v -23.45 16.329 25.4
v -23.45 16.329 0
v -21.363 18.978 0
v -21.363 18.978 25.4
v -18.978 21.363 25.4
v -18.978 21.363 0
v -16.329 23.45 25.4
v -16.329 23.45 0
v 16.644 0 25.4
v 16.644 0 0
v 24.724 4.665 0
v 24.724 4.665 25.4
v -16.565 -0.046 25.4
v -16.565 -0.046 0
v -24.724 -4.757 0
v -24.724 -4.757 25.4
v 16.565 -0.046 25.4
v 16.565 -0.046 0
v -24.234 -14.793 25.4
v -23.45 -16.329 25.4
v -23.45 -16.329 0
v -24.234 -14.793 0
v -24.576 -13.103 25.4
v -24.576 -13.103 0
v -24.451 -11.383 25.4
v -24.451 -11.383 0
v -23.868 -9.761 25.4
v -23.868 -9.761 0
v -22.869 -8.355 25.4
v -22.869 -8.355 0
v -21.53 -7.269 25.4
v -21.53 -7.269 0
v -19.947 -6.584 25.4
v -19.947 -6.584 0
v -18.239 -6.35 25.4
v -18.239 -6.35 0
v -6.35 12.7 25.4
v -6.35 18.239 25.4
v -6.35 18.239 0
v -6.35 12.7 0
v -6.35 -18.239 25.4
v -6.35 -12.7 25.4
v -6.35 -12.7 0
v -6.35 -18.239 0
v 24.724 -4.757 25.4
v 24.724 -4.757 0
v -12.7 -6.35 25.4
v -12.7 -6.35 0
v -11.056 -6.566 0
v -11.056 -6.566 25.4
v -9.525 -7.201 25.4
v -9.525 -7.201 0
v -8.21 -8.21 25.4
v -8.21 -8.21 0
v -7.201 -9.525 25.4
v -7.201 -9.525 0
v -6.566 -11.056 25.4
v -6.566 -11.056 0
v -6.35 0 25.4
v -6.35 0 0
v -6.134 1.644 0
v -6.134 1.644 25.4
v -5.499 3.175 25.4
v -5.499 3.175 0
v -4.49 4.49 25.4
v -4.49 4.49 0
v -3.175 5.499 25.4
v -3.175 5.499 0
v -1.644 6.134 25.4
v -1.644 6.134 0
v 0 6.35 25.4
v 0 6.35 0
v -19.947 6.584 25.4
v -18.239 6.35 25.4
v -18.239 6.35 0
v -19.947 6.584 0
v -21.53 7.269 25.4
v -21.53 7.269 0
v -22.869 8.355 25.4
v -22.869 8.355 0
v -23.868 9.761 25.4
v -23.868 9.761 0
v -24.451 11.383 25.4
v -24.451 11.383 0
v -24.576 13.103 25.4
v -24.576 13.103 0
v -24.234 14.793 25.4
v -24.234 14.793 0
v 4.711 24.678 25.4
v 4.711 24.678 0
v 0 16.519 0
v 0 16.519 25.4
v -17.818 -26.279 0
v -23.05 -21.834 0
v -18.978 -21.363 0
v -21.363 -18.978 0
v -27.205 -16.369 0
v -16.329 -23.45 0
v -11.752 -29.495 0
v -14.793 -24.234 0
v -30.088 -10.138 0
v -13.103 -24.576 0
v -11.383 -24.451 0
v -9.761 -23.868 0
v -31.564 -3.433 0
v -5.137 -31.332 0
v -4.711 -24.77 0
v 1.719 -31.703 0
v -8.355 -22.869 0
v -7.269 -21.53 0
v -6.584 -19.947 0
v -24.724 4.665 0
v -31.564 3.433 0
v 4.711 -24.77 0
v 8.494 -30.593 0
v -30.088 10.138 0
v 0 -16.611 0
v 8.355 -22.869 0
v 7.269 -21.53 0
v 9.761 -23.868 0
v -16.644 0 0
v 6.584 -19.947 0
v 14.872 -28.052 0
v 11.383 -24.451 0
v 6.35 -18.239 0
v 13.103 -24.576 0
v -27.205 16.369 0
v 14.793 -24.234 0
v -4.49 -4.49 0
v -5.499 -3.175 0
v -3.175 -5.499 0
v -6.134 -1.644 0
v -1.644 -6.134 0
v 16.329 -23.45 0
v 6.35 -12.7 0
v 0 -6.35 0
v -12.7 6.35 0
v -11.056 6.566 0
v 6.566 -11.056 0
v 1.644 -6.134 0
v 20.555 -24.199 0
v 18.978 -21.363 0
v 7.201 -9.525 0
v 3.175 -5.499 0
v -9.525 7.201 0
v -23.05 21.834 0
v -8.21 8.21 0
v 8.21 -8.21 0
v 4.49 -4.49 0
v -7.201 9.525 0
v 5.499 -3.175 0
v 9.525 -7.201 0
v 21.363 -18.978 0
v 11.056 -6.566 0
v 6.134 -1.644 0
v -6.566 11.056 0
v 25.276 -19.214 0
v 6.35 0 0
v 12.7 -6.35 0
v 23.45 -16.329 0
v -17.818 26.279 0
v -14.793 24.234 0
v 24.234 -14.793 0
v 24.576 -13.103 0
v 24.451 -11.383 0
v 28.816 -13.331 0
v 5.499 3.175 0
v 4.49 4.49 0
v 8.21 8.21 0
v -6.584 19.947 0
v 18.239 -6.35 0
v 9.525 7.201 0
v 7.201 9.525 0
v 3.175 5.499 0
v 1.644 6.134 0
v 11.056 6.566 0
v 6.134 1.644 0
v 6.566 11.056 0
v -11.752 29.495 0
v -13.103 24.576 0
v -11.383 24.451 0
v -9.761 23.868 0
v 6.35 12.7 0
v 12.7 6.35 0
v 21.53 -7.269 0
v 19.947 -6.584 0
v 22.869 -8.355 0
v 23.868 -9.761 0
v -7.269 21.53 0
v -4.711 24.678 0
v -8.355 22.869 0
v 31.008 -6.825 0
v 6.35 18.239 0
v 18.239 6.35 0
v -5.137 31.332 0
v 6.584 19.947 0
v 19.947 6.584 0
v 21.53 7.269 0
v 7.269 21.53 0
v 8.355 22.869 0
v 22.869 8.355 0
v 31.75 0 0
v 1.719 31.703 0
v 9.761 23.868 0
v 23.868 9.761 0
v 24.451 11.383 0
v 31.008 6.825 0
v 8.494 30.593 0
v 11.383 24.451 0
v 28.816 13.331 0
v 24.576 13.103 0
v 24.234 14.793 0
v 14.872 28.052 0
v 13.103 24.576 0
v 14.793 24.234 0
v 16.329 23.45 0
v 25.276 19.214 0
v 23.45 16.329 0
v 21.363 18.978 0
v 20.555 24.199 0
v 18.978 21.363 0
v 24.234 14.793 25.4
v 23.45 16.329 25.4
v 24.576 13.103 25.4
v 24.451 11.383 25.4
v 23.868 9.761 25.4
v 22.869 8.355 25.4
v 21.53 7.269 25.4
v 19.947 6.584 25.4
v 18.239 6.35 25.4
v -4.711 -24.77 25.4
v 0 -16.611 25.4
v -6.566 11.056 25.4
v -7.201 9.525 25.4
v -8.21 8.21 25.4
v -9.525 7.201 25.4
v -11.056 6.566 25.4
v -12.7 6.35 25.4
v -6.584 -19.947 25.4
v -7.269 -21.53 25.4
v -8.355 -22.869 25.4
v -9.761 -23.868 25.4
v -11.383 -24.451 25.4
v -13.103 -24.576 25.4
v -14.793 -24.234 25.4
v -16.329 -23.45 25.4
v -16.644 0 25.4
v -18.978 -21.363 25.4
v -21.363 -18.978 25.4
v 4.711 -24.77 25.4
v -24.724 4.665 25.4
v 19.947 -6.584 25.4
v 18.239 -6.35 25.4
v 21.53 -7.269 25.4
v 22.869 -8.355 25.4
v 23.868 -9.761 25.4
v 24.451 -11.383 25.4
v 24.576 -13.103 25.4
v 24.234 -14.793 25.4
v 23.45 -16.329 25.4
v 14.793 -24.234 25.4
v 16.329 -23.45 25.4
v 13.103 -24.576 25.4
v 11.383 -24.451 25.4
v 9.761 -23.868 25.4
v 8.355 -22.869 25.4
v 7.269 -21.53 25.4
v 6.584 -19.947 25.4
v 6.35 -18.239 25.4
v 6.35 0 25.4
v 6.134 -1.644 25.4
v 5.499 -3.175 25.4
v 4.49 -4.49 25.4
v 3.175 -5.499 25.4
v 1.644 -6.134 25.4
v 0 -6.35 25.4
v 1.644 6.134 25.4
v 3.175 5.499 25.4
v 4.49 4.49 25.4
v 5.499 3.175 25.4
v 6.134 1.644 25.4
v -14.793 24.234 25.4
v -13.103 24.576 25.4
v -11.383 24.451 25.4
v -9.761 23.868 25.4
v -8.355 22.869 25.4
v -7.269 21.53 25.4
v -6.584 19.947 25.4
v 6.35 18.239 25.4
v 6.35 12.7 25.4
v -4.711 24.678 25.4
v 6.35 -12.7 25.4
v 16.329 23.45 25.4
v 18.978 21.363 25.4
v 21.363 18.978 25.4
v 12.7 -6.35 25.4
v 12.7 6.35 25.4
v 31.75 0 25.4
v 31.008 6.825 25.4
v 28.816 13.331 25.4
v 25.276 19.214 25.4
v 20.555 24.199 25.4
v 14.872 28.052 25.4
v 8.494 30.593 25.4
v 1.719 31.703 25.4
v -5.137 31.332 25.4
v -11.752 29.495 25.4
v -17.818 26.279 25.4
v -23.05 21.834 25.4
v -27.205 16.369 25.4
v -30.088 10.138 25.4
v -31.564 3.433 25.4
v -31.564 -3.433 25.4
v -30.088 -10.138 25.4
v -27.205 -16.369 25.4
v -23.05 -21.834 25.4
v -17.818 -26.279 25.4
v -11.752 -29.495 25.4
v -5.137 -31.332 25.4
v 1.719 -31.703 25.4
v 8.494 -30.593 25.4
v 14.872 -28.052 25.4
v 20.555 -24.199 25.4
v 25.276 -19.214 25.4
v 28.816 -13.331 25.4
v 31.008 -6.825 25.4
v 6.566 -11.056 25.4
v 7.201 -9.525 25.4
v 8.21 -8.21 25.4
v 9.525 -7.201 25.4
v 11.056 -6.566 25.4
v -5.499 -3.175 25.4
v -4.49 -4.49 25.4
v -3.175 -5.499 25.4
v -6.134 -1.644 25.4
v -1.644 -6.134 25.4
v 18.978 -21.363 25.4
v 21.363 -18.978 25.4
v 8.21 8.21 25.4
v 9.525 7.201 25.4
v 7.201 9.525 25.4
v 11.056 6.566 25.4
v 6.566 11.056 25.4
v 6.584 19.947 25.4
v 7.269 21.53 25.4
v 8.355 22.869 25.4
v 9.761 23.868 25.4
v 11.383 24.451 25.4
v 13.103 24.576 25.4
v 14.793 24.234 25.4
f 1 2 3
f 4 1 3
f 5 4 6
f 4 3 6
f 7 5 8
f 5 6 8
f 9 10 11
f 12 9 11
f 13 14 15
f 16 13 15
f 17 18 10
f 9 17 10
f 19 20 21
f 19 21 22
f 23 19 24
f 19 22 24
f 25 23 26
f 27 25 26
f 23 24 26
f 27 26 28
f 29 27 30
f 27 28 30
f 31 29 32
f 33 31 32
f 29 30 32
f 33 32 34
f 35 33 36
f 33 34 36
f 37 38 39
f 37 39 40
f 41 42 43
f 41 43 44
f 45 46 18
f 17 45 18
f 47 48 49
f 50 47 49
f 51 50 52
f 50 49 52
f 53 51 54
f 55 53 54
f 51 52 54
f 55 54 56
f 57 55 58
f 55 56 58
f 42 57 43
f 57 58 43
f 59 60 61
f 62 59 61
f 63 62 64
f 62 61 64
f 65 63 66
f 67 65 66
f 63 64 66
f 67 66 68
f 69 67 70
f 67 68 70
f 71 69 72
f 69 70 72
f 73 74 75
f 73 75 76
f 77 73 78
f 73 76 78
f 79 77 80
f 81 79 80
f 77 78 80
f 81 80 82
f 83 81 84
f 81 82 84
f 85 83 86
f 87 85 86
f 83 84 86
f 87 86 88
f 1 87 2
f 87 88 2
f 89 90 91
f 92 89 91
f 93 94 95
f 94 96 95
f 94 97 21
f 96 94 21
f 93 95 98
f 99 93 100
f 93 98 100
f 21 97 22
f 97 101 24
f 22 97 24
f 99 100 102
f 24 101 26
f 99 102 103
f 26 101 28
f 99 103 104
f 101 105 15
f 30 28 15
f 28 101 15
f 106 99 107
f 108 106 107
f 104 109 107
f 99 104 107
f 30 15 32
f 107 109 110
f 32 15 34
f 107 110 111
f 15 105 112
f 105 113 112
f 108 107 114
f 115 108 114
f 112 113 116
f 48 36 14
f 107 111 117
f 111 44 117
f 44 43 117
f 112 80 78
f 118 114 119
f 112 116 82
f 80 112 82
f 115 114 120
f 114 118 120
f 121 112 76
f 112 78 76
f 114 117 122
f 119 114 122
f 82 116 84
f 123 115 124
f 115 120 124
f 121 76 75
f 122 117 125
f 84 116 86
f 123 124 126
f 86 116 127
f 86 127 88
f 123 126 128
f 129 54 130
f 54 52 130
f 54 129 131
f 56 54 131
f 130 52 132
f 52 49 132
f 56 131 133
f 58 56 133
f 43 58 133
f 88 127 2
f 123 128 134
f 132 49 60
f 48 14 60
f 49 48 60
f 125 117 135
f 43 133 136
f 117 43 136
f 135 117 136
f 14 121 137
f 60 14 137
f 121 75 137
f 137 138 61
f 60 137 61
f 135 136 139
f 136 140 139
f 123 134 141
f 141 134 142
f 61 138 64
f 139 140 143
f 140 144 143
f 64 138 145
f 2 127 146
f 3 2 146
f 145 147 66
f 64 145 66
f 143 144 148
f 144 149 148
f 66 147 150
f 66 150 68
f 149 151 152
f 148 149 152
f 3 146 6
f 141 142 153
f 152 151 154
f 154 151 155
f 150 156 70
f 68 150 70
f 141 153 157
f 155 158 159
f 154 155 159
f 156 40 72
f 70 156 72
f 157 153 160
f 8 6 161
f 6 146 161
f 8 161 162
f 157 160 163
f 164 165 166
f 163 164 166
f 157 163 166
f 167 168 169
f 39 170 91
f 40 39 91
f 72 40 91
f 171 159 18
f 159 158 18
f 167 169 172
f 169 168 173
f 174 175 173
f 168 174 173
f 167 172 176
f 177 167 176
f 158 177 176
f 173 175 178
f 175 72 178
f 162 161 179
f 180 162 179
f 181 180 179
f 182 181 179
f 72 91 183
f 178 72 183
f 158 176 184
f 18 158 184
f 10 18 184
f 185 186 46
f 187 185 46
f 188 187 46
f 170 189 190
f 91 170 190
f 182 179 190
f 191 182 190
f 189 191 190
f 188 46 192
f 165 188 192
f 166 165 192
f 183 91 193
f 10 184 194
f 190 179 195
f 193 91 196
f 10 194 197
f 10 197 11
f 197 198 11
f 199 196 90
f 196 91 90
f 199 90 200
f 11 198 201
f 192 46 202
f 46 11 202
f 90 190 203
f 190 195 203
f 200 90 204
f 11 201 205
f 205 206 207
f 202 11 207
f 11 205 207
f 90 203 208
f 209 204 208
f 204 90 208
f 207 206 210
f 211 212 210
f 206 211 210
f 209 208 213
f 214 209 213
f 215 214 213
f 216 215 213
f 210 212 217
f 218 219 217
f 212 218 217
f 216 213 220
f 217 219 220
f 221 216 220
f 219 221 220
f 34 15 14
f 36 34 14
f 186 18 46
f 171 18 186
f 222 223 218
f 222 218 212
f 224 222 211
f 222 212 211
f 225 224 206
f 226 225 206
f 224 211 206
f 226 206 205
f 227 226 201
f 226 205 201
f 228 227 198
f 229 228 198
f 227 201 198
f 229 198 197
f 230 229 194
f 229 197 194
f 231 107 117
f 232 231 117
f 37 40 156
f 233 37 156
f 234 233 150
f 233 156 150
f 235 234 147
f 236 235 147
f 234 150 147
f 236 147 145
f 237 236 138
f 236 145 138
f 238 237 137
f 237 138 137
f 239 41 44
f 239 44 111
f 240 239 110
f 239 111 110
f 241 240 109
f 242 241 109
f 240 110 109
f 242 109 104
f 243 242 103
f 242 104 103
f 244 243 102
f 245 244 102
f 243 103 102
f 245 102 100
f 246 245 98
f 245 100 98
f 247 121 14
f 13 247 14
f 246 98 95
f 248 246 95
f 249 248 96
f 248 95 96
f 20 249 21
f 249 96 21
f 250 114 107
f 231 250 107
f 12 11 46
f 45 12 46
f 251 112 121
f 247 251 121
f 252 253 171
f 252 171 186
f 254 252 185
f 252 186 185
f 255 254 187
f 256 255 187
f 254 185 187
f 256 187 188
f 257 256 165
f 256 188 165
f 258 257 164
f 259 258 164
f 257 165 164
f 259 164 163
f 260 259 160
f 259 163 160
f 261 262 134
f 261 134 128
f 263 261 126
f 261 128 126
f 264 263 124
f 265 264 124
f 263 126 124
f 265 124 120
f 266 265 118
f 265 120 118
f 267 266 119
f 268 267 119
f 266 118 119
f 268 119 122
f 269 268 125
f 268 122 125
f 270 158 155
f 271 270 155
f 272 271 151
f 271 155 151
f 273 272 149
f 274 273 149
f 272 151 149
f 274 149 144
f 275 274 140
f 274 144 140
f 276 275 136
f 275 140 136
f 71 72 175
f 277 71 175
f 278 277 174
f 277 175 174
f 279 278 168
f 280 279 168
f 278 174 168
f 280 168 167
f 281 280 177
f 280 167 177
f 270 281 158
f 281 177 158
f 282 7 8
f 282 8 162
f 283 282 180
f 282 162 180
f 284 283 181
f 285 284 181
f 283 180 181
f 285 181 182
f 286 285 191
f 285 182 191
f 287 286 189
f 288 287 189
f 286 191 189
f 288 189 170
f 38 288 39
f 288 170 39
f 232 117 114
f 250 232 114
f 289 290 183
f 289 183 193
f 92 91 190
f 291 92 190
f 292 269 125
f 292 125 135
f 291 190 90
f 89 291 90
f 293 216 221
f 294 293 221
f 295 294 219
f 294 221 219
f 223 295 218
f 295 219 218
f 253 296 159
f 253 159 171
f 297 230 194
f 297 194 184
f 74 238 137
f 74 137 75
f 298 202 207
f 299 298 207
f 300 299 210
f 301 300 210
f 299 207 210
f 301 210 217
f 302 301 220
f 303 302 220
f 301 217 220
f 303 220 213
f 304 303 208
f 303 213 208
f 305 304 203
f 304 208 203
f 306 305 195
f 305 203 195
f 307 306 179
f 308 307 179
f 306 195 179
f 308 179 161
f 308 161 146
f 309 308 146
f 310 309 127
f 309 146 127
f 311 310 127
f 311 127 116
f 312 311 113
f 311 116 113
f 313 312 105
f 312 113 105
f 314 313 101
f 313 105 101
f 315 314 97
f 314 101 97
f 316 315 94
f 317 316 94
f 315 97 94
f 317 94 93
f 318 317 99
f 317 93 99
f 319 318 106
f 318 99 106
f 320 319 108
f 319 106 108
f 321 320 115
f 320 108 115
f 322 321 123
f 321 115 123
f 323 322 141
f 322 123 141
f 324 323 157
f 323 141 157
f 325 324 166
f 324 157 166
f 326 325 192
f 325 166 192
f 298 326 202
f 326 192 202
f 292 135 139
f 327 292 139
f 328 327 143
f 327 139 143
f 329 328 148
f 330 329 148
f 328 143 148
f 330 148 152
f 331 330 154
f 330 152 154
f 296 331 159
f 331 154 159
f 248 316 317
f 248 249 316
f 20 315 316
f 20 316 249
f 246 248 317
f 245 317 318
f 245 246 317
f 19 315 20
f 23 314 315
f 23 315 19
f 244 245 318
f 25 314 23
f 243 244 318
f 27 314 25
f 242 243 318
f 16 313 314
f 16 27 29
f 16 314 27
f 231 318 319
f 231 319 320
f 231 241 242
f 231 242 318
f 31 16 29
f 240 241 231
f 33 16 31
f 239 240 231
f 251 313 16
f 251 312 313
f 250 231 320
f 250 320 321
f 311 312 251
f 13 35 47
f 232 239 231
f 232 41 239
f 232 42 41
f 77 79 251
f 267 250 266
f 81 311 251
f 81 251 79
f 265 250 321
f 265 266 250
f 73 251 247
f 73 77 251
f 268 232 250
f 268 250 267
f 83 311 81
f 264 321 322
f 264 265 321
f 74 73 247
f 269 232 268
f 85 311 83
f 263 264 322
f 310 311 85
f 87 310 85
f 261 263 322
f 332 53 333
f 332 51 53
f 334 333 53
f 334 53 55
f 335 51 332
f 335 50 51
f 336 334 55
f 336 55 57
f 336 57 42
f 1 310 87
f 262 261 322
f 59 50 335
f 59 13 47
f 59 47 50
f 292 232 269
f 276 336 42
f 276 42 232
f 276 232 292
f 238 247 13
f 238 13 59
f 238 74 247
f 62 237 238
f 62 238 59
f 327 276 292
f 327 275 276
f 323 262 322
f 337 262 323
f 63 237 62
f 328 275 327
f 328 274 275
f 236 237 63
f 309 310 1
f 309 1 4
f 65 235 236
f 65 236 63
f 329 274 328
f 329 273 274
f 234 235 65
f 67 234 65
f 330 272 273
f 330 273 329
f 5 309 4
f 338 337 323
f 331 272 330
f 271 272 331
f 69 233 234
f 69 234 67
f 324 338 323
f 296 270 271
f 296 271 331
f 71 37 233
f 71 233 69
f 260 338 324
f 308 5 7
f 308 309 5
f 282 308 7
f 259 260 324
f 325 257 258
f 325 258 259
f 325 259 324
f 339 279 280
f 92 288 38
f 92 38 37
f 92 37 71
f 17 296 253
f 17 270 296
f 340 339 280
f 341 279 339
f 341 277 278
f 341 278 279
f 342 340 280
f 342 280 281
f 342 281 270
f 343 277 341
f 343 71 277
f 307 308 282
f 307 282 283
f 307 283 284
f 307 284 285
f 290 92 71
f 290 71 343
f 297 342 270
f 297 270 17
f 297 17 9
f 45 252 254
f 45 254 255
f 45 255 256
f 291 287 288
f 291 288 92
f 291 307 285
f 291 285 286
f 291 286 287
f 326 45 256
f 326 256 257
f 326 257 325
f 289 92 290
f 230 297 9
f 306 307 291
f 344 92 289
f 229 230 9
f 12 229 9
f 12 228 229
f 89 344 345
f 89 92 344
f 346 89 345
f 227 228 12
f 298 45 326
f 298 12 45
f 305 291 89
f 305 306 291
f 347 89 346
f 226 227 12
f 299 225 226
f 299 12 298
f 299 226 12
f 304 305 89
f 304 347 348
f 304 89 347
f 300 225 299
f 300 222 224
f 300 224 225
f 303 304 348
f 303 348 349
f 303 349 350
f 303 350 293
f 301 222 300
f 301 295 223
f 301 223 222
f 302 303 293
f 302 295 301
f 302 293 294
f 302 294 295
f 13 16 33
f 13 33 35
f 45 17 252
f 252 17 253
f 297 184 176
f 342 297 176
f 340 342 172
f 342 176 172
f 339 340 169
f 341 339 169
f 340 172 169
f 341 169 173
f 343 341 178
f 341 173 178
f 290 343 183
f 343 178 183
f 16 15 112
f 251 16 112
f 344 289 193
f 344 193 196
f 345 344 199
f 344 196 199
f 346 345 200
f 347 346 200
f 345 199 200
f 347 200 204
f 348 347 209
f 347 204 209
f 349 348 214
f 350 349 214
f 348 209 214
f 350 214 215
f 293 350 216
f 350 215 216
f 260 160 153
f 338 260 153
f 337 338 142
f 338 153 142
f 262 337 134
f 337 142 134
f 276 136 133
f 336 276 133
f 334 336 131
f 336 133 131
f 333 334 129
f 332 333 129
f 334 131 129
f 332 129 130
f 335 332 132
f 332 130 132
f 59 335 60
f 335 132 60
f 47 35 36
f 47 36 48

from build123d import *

# Parameters (mm, degrees)
F0_R     = 31.75
F1_DEPTH = 25.4


with BuildPart() as f1:
    # F0 (on Top) → F1 (new body)
    with BuildSketch(Plane.XY):
        Circle(F0_R)
        Polygon((-4.710587, -24.769592), (0, -16.610617), (4.710587, -24.769592), (0, -24.769592), align=None, mode=Mode.SUBTRACT)
        Polygon((-24.723618, 4.664613), (-16.644272, 0), (-16.564643, -0.045974), (-24.723618, -4.756561), (-24.723618, 0), align=None, mode=Mode.SUBTRACT)
        with BuildLine():
            ThreePointArc((-16.328571, -23.450125), (-20.205576, -20.205576), (-23.450125, -16.328571))
            ThreePointArc((-23.450125, -16.328571), (-23.86766, -9.760521), (-18.238986, -6.35))
            Line((-18.238986, -6.35), (-12.7, -6.35))
            ThreePointArc((-12.7, -6.35), (-8.209872, -8.209872), (-6.35, -12.7))
            Line((-6.35, -12.7), (-6.35, -18.238986))
            ThreePointArc((-6.35, -18.238986), (-9.760521, -23.86766), (-16.328571, -23.450125))
        make_face(mode=Mode.SUBTRACT)
        with BuildLine():
            ThreePointArc((6.35, -12.7), (8.209872, -8.209872), (12.7, -6.35))
            Line((12.7, -6.35), (18.238986, -6.35))
            ThreePointArc((18.238986, -6.35), (23.86766, -9.760521), (23.450125, -16.328571))
            ThreePointArc((23.450125, -16.328571), (20.205576, -20.205576), (16.328571, -23.450125))
            ThreePointArc((16.328571, -23.450125), (9.760521, -23.86766), (6.35, -18.238986))
            Line((6.35, -18.238986), (6.35, -12.7))
        make_face(mode=Mode.SUBTRACT)
        Polygon((16.564643, -0.045974), (16.644272, 0), (24.723618, 4.664613), (24.723618, 0), (24.723618, -4.756561), align=None, mode=Mode.SUBTRACT)
        with BuildLine():
            Line((-6.35, 18.238986), (-6.35, 12.7))
            ThreePointArc((-6.35, 12.7), (-8.209872, 8.209872), (-12.7, 6.35))
            Line((-12.7, 6.35), (-18.238986, 6.35))
            ThreePointArc((-18.238986, 6.35), (-23.86766, 9.760521), (-23.450125, 16.328571))
            ThreePointArc((-23.450125, 16.328571), (-20.205576, 20.205576), (-16.328571, 23.450125))
            ThreePointArc((-16.328571, 23.450125), (-9.760521, 23.86766), (-6.35, 18.238986))
        make_face(mode=Mode.SUBTRACT)
        with BuildLine():
            ThreePointArc((0, 6.35), (4.490128, 4.490128), (6.35, 0))
            ThreePointArc((6.35, 0), (4.490128, -4.490128), (0, -6.35))
            ThreePointArc((0, -6.35), (-4.490128, -4.490128), (-6.35, 0))
            ThreePointArc((-6.35, 0), (-4.490128, 4.490128), (0, 6.35))
        make_face(mode=Mode.SUBTRACT)
        with BuildLine():
            ThreePointArc((12.7, 6.35), (8.209872, 8.209872), (6.35, 12.7))
            Line((6.35, 12.7), (6.35, 18.238986))
            ThreePointArc((6.35, 18.238986), (9.760521, 23.86766), (16.328571, 23.450125))
            ThreePointArc((16.328571, 23.450125), (20.205576, 20.205576), (23.450125, 16.328571))
            ThreePointArc((23.450125, 16.328571), (23.86766, 9.760521), (18.238986, 6.35))
            Line((18.238986, 6.35), (12.7, 6.35))
        make_face(mode=Mode.SUBTRACT)
        Polygon((4.710587, 24.677645), (0, 16.518669), (-4.710587, 24.677645), (0, 24.677645), align=None, mode=Mode.SUBTRACT)
    extrude(amount=F1_DEPTH)


solid = f1.part
